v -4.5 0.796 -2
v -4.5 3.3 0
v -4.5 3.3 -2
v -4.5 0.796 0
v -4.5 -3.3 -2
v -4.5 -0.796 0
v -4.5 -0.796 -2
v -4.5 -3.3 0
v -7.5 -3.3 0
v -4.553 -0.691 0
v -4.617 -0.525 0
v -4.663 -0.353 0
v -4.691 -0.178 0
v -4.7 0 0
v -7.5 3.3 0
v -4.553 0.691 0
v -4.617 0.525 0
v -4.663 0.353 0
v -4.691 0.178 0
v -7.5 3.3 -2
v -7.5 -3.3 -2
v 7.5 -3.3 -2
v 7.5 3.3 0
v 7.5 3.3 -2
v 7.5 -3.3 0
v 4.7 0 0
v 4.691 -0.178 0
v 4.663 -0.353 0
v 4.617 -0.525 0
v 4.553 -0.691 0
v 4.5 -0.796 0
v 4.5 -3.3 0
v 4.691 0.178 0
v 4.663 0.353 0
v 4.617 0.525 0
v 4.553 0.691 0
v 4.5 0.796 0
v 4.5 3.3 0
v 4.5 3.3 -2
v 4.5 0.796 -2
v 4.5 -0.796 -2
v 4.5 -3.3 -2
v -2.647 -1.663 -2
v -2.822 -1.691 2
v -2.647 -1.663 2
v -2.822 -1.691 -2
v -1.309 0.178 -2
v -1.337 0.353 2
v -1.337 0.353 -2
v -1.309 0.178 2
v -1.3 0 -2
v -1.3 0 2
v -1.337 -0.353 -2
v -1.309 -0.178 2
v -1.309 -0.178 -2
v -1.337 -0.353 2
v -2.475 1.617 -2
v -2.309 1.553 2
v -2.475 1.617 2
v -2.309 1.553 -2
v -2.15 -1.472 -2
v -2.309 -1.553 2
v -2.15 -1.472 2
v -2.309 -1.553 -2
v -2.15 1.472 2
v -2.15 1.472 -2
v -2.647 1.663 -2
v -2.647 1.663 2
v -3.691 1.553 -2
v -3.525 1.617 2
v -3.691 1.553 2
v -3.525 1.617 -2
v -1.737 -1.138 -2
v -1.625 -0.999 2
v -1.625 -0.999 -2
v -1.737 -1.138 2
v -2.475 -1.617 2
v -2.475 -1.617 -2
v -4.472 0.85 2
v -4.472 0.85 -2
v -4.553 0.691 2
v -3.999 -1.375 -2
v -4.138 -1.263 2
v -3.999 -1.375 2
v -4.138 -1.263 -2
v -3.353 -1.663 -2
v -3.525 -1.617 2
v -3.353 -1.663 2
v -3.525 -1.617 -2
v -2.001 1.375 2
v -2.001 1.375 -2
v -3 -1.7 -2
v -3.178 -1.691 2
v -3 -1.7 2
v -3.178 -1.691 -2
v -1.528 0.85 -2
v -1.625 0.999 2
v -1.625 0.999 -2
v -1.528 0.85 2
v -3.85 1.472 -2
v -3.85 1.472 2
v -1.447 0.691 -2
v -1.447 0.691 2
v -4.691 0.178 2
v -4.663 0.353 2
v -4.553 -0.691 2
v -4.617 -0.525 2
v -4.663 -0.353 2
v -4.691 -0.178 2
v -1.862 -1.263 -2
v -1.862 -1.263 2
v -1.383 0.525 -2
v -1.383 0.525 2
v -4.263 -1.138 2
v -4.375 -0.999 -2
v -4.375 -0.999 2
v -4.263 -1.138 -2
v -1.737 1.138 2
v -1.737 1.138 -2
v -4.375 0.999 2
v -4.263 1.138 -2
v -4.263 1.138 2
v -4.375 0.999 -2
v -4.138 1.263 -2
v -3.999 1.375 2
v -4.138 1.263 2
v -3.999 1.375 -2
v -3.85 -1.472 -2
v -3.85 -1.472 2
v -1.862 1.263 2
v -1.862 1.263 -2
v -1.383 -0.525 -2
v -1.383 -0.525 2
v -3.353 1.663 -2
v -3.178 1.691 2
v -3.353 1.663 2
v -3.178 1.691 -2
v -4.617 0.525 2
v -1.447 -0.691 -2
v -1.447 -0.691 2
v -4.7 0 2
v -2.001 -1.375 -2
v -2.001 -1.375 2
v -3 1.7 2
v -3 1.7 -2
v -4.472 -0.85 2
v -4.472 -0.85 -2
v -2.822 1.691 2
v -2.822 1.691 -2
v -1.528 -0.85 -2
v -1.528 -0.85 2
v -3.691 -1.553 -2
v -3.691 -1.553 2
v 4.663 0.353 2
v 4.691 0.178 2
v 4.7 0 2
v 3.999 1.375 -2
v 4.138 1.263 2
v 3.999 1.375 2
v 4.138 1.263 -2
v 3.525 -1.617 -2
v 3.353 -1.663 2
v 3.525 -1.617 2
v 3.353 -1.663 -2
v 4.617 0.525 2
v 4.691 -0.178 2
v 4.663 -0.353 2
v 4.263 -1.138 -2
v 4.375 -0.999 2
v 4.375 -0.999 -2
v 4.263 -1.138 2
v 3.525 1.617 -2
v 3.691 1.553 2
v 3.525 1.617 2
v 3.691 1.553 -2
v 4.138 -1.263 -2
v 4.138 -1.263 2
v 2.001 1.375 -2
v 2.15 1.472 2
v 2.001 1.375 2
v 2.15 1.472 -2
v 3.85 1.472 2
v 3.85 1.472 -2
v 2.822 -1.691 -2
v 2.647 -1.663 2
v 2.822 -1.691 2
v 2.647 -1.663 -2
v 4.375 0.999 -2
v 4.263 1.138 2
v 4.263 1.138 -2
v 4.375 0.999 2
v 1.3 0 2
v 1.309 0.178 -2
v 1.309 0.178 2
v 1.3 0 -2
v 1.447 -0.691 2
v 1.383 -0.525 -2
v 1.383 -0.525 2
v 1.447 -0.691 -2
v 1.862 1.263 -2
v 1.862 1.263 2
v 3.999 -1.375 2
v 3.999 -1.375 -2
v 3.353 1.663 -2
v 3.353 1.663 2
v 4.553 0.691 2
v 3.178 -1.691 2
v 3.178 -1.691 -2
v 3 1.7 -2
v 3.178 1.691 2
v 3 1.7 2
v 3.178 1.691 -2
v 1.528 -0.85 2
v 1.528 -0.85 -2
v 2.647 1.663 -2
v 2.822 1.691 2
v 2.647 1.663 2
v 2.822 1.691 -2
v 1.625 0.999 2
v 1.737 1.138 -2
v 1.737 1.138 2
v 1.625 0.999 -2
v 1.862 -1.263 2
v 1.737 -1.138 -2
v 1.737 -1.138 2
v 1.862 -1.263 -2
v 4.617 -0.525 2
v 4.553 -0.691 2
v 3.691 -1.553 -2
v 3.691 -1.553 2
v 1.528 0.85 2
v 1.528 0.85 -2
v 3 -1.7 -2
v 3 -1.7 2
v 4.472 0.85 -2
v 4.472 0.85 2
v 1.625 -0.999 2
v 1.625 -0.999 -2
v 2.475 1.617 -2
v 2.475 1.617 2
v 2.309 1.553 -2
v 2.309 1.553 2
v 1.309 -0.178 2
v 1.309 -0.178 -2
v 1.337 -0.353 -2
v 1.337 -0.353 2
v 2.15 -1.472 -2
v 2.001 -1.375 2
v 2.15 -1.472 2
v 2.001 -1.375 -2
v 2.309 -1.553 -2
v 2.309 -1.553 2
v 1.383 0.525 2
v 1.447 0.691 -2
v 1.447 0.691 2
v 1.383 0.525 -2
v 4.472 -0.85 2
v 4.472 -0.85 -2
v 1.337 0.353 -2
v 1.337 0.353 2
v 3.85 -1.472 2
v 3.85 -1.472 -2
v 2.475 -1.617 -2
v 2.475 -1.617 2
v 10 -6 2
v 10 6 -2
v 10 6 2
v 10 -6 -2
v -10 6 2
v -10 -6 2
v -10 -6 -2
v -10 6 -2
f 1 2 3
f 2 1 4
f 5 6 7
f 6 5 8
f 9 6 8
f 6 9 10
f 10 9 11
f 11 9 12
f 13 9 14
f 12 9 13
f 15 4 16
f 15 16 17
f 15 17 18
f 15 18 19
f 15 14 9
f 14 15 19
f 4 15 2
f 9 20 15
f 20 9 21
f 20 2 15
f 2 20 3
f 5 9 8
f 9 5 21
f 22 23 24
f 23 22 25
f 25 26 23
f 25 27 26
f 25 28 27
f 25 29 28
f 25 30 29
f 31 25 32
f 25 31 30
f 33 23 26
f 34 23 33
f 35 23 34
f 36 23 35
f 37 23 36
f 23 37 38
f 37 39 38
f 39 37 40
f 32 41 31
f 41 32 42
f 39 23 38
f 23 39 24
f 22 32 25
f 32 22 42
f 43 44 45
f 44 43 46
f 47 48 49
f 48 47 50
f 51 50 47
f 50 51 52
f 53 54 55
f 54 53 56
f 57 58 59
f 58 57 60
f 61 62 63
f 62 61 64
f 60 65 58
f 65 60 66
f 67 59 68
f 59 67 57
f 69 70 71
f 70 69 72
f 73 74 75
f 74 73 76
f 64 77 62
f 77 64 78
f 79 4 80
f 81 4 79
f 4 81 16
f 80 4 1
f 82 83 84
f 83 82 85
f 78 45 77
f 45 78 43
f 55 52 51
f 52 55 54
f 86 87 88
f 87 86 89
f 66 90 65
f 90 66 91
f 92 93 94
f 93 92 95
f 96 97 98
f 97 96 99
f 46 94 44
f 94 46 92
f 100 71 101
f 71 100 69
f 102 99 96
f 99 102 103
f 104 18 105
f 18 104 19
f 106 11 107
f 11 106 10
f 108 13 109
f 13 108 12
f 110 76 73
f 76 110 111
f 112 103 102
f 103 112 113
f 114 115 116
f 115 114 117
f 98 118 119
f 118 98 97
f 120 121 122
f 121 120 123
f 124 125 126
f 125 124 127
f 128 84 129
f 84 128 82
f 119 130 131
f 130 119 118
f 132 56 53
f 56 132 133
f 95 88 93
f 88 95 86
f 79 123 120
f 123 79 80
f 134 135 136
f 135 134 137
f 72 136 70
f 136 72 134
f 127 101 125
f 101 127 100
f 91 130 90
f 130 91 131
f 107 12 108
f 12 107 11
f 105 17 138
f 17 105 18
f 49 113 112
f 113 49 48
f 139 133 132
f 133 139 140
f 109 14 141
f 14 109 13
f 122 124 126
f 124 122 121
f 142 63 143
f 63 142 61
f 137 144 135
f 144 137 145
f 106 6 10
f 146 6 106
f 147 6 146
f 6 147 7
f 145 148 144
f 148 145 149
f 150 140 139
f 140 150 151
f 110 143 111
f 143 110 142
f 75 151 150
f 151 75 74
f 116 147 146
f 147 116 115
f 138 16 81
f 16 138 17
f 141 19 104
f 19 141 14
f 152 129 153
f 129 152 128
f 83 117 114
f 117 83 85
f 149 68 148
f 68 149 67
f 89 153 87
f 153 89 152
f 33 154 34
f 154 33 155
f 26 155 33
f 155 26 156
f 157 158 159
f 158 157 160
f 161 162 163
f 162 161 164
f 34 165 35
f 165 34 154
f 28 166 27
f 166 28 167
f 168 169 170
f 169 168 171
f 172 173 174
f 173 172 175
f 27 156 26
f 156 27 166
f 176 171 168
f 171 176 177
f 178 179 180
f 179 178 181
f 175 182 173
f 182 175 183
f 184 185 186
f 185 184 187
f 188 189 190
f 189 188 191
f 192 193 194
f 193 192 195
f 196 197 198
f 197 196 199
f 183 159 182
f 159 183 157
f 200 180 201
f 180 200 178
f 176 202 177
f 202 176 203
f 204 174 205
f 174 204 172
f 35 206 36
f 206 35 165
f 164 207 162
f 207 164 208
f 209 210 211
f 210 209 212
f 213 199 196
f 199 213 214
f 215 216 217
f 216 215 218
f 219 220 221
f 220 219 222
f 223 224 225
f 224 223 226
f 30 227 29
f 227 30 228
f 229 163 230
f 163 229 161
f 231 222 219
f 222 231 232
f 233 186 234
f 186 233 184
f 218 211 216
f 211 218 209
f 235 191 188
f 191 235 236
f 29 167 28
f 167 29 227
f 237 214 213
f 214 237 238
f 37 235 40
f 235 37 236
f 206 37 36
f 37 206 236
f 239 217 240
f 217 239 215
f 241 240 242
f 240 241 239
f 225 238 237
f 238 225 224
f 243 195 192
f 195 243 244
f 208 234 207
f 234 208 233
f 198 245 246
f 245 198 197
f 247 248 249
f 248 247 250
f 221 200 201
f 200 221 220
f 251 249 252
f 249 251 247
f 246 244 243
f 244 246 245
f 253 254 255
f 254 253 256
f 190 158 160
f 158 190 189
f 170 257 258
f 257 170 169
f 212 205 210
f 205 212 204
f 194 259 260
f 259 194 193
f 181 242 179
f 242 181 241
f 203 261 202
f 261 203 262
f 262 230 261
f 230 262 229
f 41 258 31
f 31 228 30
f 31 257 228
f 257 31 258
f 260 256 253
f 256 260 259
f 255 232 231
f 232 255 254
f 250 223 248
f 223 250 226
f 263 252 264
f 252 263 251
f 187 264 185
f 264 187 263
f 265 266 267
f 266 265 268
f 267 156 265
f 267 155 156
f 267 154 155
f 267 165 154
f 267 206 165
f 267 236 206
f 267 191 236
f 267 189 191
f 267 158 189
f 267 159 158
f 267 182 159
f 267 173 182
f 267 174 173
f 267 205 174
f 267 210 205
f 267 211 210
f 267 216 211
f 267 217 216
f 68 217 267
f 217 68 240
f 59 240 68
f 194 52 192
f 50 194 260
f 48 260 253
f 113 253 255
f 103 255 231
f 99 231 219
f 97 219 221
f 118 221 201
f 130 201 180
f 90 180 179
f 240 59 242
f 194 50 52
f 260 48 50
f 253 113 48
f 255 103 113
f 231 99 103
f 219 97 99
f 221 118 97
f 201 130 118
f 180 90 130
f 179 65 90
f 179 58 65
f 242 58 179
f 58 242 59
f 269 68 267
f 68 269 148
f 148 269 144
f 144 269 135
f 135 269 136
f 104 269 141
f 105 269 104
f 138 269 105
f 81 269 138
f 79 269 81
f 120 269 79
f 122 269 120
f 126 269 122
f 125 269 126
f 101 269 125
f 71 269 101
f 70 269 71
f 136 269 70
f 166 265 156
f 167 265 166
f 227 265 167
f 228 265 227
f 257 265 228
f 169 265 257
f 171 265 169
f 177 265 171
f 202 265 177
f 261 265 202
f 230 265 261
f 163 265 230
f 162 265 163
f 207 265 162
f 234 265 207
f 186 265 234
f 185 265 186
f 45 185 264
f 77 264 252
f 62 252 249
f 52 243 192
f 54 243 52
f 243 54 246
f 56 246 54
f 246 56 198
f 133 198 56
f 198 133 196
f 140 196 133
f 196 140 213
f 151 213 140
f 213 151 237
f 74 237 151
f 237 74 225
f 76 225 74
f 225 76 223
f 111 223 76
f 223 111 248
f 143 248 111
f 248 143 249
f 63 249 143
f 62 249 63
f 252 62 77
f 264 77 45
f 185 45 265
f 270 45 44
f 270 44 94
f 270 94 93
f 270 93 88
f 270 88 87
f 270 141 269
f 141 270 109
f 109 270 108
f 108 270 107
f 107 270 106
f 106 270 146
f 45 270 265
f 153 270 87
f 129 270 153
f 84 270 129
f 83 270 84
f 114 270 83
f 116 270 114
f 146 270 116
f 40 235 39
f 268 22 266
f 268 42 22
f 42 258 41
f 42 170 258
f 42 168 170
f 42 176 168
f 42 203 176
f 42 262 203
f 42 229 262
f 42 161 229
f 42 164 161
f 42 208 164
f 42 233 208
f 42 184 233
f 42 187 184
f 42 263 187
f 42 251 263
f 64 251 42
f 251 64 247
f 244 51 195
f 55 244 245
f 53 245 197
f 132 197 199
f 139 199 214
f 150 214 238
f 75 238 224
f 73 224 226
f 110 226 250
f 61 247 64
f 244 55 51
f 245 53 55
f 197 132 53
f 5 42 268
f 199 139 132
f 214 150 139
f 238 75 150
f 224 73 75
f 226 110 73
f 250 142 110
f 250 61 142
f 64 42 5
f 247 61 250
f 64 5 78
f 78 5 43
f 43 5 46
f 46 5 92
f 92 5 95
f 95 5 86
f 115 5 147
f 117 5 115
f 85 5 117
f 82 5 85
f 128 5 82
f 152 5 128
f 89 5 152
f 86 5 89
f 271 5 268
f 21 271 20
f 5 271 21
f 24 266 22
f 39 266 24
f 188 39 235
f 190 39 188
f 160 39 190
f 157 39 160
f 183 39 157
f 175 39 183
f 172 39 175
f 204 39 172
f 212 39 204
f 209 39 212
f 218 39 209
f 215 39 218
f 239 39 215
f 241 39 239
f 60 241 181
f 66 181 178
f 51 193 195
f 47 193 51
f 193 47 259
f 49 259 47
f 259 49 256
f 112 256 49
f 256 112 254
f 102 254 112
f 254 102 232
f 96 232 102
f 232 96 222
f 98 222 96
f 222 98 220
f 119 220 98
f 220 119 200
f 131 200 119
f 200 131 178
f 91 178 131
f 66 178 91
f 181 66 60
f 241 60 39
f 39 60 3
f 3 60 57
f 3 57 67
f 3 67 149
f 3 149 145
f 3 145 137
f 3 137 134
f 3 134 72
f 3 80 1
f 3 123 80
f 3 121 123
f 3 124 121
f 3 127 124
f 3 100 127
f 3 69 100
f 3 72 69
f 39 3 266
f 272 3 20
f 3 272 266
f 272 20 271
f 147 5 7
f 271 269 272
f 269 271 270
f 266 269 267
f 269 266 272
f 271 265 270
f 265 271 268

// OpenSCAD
// Cable-tie base with two strap slots.
$fn = 60;
eps = 0.02;
base_w = 12;
base_l = 20;
base_t = 4;
slot_w = 3;
slot_l = 12;
difference() {
    cube([base_l,base_w,base_t],center=true);
    for (x=[-slot_l/2,slot_l/2]) translate([x,0,-base_t/2-eps]) cube([slot_w,base_w*0.55,base_t+2*eps],center=true);
    for (x=[-base_l/2+7,base_l/2-7]) translate([x,0,-base_t/2-eps]) cylinder(d=3.4,h=base_t+2*eps);
}
